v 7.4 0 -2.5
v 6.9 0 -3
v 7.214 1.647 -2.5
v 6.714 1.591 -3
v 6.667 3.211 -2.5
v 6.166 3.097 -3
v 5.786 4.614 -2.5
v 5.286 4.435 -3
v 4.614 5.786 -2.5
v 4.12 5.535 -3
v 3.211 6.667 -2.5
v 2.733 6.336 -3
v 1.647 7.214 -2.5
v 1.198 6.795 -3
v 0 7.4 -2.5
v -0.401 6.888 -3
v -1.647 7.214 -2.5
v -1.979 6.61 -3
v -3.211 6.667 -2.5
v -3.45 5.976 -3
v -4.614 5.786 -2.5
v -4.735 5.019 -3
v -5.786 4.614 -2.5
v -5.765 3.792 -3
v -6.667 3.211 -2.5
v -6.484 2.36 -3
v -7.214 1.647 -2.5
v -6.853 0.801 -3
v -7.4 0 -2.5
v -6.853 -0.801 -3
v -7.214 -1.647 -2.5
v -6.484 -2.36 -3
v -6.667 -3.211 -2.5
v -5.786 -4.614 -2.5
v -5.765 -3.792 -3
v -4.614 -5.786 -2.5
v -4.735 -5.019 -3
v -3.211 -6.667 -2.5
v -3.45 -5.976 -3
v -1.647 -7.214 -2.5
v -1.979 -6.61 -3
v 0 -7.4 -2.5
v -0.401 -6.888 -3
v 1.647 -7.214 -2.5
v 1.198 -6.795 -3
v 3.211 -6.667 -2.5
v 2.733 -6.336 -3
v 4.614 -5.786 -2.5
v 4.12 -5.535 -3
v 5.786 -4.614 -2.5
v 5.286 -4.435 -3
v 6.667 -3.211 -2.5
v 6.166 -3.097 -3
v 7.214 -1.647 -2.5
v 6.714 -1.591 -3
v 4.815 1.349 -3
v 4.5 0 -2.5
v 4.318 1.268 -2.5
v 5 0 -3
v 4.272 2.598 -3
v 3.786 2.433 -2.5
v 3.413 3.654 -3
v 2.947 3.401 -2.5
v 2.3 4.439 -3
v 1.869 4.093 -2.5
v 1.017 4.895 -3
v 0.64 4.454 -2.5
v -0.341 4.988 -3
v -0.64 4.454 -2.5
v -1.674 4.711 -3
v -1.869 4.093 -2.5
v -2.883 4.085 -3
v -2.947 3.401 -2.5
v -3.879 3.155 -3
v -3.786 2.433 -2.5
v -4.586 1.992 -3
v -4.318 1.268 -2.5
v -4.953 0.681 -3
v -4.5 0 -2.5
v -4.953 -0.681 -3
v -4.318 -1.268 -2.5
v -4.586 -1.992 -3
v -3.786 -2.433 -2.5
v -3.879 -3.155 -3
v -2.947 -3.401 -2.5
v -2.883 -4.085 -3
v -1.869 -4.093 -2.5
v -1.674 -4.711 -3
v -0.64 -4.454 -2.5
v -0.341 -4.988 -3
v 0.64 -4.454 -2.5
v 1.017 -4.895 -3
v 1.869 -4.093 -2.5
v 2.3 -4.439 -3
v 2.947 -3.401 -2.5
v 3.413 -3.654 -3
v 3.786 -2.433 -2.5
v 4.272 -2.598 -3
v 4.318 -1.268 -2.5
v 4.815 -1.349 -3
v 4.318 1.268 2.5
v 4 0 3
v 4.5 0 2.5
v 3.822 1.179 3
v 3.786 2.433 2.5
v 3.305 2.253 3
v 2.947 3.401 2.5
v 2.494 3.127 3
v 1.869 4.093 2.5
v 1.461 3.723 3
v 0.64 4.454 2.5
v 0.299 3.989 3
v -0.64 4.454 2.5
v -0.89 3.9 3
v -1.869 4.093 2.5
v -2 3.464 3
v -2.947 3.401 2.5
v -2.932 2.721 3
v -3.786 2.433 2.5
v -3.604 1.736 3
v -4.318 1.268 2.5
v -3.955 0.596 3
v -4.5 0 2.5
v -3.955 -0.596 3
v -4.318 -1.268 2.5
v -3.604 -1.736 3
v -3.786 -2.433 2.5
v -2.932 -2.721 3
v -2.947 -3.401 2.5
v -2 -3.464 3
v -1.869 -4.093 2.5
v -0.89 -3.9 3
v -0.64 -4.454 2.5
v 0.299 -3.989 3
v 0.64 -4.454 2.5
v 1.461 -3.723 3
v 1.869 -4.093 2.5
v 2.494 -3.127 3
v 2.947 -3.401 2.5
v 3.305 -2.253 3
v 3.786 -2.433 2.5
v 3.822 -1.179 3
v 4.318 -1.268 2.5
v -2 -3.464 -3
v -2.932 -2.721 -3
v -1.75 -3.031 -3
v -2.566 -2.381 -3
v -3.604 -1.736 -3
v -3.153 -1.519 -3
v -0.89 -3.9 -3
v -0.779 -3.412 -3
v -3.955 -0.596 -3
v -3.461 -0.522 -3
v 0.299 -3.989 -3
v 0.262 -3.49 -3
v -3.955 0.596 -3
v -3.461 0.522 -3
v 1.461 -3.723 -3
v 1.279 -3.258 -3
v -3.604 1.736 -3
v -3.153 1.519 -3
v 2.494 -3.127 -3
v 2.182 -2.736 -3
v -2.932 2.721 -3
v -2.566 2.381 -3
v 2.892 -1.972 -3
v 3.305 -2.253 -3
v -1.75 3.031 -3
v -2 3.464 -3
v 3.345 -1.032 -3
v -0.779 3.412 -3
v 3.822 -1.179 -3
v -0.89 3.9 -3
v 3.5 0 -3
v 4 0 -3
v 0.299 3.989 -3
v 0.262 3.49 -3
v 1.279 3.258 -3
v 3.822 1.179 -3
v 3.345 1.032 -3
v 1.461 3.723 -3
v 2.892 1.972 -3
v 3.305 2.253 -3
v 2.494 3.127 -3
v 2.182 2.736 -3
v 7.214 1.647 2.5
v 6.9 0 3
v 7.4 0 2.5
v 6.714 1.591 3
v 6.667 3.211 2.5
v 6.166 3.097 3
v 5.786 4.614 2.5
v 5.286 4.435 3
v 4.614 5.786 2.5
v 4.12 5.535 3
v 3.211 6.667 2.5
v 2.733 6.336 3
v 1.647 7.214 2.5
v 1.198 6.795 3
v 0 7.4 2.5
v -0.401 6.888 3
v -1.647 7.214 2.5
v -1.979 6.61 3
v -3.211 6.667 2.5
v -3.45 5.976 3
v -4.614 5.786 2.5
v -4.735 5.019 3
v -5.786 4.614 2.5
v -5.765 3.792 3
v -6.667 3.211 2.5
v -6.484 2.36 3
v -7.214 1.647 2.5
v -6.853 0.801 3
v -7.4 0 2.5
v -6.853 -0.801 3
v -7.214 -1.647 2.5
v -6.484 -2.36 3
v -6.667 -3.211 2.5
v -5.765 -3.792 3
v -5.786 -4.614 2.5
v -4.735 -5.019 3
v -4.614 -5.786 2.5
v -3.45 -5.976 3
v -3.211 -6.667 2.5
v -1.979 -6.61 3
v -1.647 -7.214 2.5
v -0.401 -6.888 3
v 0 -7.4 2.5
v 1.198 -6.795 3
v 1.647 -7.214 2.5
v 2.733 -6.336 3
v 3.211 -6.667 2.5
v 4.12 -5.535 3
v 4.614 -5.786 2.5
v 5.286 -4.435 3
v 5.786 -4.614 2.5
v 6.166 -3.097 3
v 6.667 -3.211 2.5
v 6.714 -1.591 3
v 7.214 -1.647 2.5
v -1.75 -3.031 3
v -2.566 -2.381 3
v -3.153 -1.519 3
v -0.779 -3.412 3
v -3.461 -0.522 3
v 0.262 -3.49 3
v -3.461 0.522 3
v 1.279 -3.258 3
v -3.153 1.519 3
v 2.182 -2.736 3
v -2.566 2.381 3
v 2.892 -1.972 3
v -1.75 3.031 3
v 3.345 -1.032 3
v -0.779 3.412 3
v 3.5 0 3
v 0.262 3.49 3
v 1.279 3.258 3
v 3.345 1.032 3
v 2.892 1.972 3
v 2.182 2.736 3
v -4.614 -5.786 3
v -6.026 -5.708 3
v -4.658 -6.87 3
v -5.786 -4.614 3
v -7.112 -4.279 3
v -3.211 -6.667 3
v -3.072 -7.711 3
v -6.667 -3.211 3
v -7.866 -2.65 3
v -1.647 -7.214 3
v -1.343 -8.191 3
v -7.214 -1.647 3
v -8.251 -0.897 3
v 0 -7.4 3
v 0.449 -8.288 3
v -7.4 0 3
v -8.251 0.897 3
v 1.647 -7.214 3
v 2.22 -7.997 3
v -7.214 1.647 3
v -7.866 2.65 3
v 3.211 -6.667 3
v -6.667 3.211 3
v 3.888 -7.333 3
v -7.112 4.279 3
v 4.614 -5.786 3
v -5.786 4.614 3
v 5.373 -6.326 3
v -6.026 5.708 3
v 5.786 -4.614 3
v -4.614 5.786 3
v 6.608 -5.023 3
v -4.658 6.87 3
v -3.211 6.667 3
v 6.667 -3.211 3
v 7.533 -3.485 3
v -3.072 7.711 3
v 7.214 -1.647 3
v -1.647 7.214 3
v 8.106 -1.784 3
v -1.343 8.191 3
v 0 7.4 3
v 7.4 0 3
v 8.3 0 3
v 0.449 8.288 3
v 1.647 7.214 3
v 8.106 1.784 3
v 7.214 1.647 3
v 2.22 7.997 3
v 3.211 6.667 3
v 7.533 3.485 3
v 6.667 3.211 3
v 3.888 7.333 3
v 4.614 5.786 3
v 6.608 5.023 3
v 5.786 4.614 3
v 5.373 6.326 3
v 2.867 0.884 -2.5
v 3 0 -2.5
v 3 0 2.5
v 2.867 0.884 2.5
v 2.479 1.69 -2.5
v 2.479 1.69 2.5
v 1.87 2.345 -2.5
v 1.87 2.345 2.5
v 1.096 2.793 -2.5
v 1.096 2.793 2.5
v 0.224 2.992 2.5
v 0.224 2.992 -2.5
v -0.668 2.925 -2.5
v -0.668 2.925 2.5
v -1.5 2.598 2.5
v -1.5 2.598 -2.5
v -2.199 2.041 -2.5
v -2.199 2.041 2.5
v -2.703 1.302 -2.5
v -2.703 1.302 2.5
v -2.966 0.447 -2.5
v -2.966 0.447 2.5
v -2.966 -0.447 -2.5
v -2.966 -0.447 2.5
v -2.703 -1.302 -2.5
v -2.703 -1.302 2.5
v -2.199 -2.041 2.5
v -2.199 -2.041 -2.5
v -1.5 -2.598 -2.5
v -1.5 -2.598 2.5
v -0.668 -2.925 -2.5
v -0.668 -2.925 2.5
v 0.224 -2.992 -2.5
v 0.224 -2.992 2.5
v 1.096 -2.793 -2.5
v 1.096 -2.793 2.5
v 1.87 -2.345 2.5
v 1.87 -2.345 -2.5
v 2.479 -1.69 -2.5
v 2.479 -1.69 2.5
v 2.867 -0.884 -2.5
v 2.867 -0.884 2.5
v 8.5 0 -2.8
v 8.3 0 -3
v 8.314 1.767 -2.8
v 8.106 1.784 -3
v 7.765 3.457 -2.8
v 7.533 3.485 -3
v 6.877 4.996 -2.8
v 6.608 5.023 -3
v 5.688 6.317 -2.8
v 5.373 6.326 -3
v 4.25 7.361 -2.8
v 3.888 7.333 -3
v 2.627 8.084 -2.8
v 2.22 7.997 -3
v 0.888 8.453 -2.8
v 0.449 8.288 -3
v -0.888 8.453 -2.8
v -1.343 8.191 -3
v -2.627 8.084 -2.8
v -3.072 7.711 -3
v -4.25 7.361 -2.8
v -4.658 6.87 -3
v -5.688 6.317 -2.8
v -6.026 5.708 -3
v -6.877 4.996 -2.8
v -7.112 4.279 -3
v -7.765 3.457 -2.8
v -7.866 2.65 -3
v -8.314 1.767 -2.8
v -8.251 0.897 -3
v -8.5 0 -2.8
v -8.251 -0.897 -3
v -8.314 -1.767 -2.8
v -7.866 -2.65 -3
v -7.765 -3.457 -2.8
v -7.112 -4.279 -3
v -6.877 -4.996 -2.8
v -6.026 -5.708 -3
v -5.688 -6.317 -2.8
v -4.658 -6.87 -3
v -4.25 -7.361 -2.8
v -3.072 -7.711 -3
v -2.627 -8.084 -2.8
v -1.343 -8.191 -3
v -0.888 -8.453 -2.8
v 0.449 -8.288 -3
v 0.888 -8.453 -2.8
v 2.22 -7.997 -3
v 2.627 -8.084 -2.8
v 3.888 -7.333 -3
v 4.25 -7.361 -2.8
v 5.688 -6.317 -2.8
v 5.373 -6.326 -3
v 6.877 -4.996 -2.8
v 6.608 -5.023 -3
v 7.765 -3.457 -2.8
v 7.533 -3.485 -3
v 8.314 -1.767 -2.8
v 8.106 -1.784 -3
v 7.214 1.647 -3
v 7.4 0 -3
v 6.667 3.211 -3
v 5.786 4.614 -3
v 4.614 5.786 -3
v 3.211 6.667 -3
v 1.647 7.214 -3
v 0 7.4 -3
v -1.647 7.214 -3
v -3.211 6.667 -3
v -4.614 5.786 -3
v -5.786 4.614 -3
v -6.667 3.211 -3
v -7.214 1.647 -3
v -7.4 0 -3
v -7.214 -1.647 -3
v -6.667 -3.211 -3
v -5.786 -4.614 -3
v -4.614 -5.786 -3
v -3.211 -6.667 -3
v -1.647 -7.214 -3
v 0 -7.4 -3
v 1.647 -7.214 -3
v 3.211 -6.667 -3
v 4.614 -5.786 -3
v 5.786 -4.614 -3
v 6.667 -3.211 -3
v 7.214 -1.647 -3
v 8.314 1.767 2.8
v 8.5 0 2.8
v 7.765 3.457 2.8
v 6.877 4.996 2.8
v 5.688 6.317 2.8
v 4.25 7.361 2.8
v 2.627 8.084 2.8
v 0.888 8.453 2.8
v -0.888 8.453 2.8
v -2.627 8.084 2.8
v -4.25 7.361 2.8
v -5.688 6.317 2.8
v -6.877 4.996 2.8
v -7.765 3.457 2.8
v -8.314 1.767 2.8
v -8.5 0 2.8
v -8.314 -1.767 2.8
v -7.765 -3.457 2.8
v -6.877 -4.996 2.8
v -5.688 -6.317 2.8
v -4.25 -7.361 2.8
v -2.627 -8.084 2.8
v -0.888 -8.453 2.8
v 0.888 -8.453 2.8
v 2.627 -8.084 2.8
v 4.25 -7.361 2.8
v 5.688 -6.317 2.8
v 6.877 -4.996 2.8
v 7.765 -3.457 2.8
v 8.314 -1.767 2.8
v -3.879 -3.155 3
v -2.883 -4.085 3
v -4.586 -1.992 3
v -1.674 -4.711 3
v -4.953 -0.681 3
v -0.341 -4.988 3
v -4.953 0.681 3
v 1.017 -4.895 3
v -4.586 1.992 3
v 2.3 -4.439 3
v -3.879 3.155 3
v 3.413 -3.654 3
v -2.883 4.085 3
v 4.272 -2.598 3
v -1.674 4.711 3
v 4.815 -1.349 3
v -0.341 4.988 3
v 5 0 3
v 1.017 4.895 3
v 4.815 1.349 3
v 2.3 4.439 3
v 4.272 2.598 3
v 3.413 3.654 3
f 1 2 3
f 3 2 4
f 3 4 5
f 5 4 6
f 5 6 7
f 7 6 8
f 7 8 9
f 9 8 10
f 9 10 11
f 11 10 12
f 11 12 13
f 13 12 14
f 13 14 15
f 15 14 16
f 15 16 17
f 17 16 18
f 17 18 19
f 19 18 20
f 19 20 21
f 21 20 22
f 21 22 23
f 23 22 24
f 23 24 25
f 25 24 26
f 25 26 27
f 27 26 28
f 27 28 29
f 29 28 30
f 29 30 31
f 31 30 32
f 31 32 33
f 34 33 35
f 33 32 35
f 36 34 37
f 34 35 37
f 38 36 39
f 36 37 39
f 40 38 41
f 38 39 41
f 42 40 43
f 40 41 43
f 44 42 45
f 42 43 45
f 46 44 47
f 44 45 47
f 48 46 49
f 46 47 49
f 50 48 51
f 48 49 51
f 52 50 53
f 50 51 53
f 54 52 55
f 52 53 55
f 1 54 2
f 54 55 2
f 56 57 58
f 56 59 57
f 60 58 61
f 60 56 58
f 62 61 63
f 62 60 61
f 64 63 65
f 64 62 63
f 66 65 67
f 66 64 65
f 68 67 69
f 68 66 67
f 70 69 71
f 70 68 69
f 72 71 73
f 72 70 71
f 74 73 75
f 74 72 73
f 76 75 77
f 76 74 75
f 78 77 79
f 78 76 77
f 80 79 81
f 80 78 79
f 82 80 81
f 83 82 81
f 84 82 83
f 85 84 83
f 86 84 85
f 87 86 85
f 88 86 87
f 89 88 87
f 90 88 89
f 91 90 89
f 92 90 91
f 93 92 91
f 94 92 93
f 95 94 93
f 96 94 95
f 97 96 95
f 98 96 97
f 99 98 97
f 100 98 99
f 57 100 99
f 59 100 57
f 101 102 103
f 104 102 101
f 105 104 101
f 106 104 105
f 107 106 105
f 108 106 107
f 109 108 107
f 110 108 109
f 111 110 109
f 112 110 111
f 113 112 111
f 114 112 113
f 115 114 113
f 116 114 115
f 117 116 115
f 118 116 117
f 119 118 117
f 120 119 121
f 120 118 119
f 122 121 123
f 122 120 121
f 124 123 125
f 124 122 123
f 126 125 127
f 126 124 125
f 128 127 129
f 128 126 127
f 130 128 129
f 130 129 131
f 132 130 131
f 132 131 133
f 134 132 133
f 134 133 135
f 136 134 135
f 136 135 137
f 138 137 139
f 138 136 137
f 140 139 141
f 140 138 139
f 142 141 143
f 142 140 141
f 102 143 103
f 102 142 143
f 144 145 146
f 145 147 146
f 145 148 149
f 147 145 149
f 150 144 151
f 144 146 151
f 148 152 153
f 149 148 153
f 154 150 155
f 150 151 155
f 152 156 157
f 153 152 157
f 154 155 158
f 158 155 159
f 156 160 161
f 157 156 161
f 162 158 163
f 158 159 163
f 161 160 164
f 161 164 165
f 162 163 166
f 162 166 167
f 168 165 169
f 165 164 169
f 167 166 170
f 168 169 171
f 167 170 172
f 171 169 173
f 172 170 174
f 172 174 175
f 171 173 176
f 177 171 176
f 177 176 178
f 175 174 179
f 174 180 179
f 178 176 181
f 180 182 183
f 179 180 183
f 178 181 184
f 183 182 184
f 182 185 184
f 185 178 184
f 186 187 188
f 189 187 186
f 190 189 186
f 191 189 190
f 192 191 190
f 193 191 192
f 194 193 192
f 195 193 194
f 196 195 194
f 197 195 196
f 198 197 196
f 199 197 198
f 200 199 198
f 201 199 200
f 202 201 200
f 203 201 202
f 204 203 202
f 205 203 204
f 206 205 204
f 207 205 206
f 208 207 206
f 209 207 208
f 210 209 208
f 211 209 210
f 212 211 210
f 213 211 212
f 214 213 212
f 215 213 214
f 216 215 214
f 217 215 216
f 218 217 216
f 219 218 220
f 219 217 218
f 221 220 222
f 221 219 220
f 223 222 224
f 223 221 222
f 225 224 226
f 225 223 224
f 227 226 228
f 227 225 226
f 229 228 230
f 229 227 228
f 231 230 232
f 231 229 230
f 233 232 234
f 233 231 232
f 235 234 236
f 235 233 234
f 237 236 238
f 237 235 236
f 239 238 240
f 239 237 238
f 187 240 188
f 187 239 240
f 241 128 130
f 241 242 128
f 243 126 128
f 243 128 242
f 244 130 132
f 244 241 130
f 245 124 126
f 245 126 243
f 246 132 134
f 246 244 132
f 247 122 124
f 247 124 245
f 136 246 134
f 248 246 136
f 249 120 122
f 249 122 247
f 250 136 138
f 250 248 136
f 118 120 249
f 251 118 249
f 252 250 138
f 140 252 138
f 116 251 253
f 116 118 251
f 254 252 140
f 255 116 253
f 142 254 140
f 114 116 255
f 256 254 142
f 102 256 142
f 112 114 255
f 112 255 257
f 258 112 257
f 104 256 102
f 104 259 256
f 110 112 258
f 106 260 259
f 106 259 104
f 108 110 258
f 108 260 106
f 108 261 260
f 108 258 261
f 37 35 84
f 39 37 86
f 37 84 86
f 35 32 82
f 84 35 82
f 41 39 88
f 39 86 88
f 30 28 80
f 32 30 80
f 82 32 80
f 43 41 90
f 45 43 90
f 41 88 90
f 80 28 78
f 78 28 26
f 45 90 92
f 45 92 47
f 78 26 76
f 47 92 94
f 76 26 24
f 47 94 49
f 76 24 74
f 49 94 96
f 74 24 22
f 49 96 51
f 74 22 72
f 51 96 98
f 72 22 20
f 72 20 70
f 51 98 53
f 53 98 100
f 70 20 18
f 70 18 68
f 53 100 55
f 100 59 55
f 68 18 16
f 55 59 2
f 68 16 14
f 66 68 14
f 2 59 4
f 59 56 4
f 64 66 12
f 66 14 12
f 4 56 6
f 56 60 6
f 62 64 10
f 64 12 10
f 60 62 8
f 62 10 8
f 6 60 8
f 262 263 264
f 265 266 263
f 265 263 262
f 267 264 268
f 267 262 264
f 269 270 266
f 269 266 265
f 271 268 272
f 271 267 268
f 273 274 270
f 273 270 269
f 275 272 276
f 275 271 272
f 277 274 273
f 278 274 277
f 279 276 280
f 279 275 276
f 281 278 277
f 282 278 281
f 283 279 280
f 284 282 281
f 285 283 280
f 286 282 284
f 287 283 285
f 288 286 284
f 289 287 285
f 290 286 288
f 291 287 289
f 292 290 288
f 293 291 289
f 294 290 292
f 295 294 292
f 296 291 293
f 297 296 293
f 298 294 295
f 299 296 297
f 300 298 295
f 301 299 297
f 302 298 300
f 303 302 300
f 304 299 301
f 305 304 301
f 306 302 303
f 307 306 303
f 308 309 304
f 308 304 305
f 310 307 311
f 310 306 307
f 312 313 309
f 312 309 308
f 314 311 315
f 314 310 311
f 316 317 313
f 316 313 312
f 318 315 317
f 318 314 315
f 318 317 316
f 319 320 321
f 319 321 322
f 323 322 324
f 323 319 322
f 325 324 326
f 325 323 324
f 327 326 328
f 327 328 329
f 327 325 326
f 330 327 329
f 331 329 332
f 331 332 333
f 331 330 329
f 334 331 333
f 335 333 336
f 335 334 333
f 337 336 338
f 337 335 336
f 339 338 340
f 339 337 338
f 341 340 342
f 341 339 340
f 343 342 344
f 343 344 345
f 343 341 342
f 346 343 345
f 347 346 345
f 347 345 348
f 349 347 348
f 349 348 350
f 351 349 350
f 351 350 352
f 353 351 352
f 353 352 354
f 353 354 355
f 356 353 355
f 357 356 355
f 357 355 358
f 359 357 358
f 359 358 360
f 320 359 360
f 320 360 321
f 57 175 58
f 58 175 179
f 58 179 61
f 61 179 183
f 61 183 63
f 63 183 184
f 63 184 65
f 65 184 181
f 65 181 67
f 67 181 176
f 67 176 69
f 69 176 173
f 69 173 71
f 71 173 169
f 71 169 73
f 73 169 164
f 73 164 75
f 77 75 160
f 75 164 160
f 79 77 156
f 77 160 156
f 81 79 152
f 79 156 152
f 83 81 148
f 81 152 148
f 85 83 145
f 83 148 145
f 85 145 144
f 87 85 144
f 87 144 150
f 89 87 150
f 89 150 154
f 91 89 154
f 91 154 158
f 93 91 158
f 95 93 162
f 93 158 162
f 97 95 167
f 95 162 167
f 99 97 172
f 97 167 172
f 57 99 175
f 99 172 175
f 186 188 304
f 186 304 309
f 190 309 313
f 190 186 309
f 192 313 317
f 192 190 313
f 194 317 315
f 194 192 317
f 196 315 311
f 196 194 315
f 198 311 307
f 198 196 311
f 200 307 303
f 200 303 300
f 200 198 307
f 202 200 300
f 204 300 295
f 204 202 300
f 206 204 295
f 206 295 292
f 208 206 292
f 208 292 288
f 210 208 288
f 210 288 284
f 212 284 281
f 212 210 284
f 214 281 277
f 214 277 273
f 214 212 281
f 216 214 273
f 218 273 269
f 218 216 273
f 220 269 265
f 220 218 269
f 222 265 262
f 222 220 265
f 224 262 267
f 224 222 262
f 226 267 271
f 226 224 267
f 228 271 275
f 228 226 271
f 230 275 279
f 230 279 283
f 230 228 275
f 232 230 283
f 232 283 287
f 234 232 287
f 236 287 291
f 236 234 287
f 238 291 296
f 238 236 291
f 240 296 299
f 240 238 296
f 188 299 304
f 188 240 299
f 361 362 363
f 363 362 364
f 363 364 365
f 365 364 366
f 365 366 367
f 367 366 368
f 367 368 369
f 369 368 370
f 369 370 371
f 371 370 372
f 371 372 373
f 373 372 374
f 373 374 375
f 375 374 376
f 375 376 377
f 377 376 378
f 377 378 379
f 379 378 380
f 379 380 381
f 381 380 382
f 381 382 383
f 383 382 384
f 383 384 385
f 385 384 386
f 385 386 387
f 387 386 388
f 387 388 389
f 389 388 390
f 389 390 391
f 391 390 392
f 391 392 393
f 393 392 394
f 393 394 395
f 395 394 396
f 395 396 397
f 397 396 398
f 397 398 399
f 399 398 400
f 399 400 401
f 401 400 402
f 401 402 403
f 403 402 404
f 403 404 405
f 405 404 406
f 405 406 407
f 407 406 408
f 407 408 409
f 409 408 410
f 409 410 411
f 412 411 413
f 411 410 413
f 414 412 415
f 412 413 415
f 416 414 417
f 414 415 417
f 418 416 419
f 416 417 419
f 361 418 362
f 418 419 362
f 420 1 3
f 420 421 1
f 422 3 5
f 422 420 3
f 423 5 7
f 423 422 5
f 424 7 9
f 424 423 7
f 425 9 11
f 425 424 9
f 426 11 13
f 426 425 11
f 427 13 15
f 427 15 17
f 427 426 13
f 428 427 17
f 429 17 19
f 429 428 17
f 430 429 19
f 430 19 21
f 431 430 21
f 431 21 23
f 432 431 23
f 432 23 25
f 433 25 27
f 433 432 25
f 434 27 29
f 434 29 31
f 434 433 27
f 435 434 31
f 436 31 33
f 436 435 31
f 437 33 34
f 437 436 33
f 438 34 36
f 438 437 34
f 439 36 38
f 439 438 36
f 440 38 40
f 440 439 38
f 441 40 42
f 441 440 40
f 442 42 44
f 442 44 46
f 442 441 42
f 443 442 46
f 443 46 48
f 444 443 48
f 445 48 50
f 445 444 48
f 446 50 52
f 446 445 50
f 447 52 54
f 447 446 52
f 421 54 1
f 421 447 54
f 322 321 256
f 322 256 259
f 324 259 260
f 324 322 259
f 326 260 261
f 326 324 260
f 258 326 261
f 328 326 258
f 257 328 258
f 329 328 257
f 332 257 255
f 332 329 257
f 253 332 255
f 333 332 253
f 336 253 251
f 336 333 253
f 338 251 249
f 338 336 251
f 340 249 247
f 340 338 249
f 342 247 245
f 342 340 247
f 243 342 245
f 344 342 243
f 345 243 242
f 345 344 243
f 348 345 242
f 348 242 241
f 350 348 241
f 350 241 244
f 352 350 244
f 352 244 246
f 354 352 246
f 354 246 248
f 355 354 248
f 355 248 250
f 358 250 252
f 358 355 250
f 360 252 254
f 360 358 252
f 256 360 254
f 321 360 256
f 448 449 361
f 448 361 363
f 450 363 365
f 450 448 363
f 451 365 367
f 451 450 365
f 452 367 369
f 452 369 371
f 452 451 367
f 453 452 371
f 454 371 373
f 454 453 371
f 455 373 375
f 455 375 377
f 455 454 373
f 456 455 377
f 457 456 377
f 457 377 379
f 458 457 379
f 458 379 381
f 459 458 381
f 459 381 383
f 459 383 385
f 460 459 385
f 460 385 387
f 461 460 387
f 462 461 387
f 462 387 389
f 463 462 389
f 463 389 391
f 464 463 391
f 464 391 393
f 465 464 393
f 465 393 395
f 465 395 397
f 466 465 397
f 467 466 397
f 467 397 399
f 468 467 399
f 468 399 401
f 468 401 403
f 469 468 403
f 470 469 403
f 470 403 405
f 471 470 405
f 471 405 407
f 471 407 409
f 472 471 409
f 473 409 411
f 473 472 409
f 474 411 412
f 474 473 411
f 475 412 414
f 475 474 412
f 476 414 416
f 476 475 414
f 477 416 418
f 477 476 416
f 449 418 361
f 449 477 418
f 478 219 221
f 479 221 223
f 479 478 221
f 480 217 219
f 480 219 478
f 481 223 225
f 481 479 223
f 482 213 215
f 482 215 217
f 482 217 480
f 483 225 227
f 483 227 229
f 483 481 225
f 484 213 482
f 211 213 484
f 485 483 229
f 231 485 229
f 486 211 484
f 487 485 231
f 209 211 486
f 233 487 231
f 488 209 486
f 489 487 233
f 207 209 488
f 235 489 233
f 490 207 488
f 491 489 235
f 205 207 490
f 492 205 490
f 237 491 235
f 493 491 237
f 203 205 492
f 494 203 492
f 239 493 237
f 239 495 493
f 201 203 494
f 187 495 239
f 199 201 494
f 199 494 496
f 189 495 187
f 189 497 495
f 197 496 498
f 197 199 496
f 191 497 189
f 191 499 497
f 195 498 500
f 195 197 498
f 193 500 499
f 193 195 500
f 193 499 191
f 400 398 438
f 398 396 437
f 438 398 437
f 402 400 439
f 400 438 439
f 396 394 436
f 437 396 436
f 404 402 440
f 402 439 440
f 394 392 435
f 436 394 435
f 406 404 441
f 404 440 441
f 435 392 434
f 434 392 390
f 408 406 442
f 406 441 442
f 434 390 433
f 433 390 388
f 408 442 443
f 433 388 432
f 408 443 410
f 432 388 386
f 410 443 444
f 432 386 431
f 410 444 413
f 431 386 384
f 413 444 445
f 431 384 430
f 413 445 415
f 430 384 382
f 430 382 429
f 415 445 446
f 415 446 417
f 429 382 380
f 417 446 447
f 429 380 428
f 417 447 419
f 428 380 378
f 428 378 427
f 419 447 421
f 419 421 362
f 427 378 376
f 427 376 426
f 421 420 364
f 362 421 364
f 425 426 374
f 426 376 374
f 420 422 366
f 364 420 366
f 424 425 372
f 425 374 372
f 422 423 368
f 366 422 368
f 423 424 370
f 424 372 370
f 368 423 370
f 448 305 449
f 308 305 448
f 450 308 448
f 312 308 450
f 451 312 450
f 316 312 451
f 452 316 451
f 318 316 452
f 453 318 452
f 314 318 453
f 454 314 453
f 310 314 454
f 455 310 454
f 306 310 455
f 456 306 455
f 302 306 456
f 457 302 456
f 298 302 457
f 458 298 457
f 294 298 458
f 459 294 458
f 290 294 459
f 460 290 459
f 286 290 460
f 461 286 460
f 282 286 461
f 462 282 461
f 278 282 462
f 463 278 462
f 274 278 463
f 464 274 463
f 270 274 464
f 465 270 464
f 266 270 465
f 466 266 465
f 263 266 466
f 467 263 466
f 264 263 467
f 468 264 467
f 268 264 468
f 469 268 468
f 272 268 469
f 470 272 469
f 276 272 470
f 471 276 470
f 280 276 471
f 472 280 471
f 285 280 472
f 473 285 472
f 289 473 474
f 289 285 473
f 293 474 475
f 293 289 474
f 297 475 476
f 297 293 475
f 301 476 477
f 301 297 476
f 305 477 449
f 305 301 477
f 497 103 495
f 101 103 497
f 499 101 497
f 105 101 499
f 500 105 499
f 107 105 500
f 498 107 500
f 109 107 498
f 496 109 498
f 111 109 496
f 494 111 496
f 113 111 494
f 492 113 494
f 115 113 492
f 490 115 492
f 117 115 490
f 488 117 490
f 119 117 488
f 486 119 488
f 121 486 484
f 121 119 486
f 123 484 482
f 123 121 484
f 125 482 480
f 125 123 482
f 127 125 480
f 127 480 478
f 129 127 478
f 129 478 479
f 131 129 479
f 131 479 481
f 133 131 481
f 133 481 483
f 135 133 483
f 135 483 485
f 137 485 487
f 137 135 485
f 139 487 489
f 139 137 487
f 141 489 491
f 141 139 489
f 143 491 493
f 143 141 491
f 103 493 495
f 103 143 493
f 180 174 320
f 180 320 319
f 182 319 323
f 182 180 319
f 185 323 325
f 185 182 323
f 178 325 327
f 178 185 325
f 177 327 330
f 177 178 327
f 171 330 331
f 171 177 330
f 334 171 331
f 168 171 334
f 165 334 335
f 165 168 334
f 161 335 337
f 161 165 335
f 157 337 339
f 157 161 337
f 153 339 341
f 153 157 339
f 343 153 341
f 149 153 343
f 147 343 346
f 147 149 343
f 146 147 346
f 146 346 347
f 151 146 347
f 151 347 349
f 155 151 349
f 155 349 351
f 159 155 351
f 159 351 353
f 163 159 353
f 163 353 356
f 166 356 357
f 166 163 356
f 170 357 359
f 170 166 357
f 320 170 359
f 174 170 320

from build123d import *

# Parameters (mm, degrees)
SKETCH001_R     = 4.5
SKETCH001_R_2   = 3
PAD001_DEPTH    = 3
CHAMFER_SIZE    = 0.5
SKETCH002_R     = 7.4
SKETCH002_R_2   = 4.5
PAD002_DEPTH    = 3
CHAMFER001_SIZE = 0.5
SKETCH_R        = 8.5
SKETCH_R_2      = 7.4
PAD_DEPTH       = 3
CHAMFER002_SIZE = 0.2


with BuildPart() as innerrace:
    # Sketch001 → Pad001 (new body, symmetric)
    with BuildSketch(Plane.XY):
        Circle(SKETCH001_R)
        Circle(SKETCH001_R_2, mode=Mode.SUBTRACT)
    extrude(amount=PAD001_DEPTH, both=True)

    # Chamfer
    chamfer_edges = [innerrace.edges().sort_by_distance(p)[0] for p in [
        (-4.5, 0, 3),
        (-3, 0, 3),
        (-4.5, 0, -3),
        (-3, 0, -3),
    ]]
    chamfer(chamfer_edges, length=CHAMFER_SIZE)


with BuildPart() as seal:
    # Sketch002 → Pad002 (new body, symmetric)
    with BuildSketch(Plane.XY):
        Circle(SKETCH002_R)
        Circle(SKETCH002_R_2, mode=Mode.SUBTRACT)
    extrude(amount=PAD002_DEPTH, both=True)

    # Chamfer001
    chamfer001_edges = [seal.edges().sort_by_distance(p)[0] for p in [
        (-7.4, 0, -3),
        (-4.5, 0, -3),
        (-7.4, 0, 3),
        (-4.5, 0, 3),
    ]]
    chamfer(chamfer001_edges, length=CHAMFER001_SIZE)


with BuildPart() as fusion:
    # Sketch → Pad (new body, symmetric)
    with BuildSketch(Plane.XY):
        Circle(SKETCH_R)
        Circle(SKETCH_R_2, mode=Mode.SUBTRACT)
    extrude(amount=PAD_DEPTH, both=True)

    # Chamfer002
    chamfer002_edges = [fusion.edges().sort_by_distance(p)[0] for p in [
        (8.5, 0, 0),
        (-8.5, 0, -3),
        (-8.5, 0, 3),
    ]]
    chamfer(chamfer002_edges, length=CHAMFER002_SIZE)

    # Fusion: union InnerRace, Seal
    add(innerrace.part)
    add(seal.part)


solid = fusion.part
